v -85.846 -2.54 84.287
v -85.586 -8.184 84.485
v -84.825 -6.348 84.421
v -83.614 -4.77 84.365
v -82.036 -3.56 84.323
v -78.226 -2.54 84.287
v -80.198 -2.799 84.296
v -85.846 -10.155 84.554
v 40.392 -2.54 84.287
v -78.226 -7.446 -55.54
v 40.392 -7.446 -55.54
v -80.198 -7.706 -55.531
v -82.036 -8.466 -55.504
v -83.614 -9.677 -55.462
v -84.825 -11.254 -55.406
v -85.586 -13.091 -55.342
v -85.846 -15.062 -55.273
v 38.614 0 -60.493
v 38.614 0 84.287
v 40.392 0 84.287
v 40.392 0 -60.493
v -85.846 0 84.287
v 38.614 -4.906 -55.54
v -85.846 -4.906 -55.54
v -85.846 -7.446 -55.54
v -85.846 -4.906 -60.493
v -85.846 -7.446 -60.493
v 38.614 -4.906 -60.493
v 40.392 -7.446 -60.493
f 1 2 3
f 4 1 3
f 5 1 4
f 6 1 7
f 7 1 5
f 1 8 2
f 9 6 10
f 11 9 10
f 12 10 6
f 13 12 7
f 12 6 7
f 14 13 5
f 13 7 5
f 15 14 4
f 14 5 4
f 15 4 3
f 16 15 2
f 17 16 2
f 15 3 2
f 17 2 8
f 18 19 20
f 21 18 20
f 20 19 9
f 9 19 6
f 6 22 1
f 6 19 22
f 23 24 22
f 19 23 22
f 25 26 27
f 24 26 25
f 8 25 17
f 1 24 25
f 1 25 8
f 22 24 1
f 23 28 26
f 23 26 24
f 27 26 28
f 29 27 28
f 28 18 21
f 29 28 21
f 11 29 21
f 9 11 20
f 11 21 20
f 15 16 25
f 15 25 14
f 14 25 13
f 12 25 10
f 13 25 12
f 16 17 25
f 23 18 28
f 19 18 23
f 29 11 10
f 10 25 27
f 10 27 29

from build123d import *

# Parameters (mm, degrees)
F0_W     = 126.238
F0_H     = 156.718
F1_DEPTH = 25.4
F3_DEPTH = 124.46
F4_DEPTH = 152.4
F5_W     = 7.62
F5_H     = 139.9129815726
F6_DEPTH = 7.62
F8_DEPTH = 152.4


with BuildPart() as f1:
    # F0 (on Front) → F1 (new body)
    with BuildSketch(Plane.XZ):
        with Locations((-22.7268721203, 17.8661712823)):
            Rectangle(F0_W, F0_H)
    extrude(amount=F1_DEPTH)

    # F2 (on face) → F3 (cut)
    with BuildSketch(Plane(origin=(-85.8458721203, 0, 0), x_dir=(0, -1, 0), z_dir=(-1, 0, 0))):
        Polygon((4.9062082183, -55.539762938), (0, 84.2871712823), (0, -60.4928287177), (4.9062082183, -60.4928287177), align=None)
    extrude(amount=-F3_DEPTH, mode=Mode.SUBTRACT)

    # F2 (on face) → F4 (cut)
    with BuildSketch(Plane(origin=(-85.8458721203, 0, 0), x_dir=(0, -1, 0), z_dir=(-1, 0, 0))):
        Polygon((0, 84.2871712823), (2.54, 84.2871712823), (7.4462082183, -55.539762938), (7.4462082183, -60.4928287177), (25.4, -60.4928287177), (25.4, 96.2251712823), (0, 96.2251712823), align=None)
    extrude(amount=-F4_DEPTH, mode=Mode.SUBTRACT)

    # F5 (on face) → F6 (join)
    with BuildSketch(Plane(origin=(0, -5.4906847606, 0.1926556056), x_dir=(1, 0, 0), z_dir=(0, -0.9993849938, 0.0350661401))):
        with Locations((-82.0358721203, 14.1897753664)):
            Rectangle(F5_W, F5_H)
    extrude(amount=F6_DEPTH)

    # F7 (on face) → F8 (cut)
    with BuildSketch(Plane(origin=(0, 2.9506847606, 84.0945156767), x_dir=(1, 0, 0), z_dir=(0, 0.0350661401, 0.9993849938))):
        with BuildLine():
            Line((-78.2258721203, -13.1140636438), (-78.2258721203, -5.4940636438))
            ThreePointArc((-78.2258721203, -5.4940636438), (-83.6140257929, -7.7259099712), (-85.8458721203, -13.1140636438))
            Line((-85.8458721203, -13.1140636438), (-78.2258721203, -13.1140636438))
        make_face()
    extrude(amount=-F8_DEPTH, mode=Mode.SUBTRACT)


solid = f1.part
